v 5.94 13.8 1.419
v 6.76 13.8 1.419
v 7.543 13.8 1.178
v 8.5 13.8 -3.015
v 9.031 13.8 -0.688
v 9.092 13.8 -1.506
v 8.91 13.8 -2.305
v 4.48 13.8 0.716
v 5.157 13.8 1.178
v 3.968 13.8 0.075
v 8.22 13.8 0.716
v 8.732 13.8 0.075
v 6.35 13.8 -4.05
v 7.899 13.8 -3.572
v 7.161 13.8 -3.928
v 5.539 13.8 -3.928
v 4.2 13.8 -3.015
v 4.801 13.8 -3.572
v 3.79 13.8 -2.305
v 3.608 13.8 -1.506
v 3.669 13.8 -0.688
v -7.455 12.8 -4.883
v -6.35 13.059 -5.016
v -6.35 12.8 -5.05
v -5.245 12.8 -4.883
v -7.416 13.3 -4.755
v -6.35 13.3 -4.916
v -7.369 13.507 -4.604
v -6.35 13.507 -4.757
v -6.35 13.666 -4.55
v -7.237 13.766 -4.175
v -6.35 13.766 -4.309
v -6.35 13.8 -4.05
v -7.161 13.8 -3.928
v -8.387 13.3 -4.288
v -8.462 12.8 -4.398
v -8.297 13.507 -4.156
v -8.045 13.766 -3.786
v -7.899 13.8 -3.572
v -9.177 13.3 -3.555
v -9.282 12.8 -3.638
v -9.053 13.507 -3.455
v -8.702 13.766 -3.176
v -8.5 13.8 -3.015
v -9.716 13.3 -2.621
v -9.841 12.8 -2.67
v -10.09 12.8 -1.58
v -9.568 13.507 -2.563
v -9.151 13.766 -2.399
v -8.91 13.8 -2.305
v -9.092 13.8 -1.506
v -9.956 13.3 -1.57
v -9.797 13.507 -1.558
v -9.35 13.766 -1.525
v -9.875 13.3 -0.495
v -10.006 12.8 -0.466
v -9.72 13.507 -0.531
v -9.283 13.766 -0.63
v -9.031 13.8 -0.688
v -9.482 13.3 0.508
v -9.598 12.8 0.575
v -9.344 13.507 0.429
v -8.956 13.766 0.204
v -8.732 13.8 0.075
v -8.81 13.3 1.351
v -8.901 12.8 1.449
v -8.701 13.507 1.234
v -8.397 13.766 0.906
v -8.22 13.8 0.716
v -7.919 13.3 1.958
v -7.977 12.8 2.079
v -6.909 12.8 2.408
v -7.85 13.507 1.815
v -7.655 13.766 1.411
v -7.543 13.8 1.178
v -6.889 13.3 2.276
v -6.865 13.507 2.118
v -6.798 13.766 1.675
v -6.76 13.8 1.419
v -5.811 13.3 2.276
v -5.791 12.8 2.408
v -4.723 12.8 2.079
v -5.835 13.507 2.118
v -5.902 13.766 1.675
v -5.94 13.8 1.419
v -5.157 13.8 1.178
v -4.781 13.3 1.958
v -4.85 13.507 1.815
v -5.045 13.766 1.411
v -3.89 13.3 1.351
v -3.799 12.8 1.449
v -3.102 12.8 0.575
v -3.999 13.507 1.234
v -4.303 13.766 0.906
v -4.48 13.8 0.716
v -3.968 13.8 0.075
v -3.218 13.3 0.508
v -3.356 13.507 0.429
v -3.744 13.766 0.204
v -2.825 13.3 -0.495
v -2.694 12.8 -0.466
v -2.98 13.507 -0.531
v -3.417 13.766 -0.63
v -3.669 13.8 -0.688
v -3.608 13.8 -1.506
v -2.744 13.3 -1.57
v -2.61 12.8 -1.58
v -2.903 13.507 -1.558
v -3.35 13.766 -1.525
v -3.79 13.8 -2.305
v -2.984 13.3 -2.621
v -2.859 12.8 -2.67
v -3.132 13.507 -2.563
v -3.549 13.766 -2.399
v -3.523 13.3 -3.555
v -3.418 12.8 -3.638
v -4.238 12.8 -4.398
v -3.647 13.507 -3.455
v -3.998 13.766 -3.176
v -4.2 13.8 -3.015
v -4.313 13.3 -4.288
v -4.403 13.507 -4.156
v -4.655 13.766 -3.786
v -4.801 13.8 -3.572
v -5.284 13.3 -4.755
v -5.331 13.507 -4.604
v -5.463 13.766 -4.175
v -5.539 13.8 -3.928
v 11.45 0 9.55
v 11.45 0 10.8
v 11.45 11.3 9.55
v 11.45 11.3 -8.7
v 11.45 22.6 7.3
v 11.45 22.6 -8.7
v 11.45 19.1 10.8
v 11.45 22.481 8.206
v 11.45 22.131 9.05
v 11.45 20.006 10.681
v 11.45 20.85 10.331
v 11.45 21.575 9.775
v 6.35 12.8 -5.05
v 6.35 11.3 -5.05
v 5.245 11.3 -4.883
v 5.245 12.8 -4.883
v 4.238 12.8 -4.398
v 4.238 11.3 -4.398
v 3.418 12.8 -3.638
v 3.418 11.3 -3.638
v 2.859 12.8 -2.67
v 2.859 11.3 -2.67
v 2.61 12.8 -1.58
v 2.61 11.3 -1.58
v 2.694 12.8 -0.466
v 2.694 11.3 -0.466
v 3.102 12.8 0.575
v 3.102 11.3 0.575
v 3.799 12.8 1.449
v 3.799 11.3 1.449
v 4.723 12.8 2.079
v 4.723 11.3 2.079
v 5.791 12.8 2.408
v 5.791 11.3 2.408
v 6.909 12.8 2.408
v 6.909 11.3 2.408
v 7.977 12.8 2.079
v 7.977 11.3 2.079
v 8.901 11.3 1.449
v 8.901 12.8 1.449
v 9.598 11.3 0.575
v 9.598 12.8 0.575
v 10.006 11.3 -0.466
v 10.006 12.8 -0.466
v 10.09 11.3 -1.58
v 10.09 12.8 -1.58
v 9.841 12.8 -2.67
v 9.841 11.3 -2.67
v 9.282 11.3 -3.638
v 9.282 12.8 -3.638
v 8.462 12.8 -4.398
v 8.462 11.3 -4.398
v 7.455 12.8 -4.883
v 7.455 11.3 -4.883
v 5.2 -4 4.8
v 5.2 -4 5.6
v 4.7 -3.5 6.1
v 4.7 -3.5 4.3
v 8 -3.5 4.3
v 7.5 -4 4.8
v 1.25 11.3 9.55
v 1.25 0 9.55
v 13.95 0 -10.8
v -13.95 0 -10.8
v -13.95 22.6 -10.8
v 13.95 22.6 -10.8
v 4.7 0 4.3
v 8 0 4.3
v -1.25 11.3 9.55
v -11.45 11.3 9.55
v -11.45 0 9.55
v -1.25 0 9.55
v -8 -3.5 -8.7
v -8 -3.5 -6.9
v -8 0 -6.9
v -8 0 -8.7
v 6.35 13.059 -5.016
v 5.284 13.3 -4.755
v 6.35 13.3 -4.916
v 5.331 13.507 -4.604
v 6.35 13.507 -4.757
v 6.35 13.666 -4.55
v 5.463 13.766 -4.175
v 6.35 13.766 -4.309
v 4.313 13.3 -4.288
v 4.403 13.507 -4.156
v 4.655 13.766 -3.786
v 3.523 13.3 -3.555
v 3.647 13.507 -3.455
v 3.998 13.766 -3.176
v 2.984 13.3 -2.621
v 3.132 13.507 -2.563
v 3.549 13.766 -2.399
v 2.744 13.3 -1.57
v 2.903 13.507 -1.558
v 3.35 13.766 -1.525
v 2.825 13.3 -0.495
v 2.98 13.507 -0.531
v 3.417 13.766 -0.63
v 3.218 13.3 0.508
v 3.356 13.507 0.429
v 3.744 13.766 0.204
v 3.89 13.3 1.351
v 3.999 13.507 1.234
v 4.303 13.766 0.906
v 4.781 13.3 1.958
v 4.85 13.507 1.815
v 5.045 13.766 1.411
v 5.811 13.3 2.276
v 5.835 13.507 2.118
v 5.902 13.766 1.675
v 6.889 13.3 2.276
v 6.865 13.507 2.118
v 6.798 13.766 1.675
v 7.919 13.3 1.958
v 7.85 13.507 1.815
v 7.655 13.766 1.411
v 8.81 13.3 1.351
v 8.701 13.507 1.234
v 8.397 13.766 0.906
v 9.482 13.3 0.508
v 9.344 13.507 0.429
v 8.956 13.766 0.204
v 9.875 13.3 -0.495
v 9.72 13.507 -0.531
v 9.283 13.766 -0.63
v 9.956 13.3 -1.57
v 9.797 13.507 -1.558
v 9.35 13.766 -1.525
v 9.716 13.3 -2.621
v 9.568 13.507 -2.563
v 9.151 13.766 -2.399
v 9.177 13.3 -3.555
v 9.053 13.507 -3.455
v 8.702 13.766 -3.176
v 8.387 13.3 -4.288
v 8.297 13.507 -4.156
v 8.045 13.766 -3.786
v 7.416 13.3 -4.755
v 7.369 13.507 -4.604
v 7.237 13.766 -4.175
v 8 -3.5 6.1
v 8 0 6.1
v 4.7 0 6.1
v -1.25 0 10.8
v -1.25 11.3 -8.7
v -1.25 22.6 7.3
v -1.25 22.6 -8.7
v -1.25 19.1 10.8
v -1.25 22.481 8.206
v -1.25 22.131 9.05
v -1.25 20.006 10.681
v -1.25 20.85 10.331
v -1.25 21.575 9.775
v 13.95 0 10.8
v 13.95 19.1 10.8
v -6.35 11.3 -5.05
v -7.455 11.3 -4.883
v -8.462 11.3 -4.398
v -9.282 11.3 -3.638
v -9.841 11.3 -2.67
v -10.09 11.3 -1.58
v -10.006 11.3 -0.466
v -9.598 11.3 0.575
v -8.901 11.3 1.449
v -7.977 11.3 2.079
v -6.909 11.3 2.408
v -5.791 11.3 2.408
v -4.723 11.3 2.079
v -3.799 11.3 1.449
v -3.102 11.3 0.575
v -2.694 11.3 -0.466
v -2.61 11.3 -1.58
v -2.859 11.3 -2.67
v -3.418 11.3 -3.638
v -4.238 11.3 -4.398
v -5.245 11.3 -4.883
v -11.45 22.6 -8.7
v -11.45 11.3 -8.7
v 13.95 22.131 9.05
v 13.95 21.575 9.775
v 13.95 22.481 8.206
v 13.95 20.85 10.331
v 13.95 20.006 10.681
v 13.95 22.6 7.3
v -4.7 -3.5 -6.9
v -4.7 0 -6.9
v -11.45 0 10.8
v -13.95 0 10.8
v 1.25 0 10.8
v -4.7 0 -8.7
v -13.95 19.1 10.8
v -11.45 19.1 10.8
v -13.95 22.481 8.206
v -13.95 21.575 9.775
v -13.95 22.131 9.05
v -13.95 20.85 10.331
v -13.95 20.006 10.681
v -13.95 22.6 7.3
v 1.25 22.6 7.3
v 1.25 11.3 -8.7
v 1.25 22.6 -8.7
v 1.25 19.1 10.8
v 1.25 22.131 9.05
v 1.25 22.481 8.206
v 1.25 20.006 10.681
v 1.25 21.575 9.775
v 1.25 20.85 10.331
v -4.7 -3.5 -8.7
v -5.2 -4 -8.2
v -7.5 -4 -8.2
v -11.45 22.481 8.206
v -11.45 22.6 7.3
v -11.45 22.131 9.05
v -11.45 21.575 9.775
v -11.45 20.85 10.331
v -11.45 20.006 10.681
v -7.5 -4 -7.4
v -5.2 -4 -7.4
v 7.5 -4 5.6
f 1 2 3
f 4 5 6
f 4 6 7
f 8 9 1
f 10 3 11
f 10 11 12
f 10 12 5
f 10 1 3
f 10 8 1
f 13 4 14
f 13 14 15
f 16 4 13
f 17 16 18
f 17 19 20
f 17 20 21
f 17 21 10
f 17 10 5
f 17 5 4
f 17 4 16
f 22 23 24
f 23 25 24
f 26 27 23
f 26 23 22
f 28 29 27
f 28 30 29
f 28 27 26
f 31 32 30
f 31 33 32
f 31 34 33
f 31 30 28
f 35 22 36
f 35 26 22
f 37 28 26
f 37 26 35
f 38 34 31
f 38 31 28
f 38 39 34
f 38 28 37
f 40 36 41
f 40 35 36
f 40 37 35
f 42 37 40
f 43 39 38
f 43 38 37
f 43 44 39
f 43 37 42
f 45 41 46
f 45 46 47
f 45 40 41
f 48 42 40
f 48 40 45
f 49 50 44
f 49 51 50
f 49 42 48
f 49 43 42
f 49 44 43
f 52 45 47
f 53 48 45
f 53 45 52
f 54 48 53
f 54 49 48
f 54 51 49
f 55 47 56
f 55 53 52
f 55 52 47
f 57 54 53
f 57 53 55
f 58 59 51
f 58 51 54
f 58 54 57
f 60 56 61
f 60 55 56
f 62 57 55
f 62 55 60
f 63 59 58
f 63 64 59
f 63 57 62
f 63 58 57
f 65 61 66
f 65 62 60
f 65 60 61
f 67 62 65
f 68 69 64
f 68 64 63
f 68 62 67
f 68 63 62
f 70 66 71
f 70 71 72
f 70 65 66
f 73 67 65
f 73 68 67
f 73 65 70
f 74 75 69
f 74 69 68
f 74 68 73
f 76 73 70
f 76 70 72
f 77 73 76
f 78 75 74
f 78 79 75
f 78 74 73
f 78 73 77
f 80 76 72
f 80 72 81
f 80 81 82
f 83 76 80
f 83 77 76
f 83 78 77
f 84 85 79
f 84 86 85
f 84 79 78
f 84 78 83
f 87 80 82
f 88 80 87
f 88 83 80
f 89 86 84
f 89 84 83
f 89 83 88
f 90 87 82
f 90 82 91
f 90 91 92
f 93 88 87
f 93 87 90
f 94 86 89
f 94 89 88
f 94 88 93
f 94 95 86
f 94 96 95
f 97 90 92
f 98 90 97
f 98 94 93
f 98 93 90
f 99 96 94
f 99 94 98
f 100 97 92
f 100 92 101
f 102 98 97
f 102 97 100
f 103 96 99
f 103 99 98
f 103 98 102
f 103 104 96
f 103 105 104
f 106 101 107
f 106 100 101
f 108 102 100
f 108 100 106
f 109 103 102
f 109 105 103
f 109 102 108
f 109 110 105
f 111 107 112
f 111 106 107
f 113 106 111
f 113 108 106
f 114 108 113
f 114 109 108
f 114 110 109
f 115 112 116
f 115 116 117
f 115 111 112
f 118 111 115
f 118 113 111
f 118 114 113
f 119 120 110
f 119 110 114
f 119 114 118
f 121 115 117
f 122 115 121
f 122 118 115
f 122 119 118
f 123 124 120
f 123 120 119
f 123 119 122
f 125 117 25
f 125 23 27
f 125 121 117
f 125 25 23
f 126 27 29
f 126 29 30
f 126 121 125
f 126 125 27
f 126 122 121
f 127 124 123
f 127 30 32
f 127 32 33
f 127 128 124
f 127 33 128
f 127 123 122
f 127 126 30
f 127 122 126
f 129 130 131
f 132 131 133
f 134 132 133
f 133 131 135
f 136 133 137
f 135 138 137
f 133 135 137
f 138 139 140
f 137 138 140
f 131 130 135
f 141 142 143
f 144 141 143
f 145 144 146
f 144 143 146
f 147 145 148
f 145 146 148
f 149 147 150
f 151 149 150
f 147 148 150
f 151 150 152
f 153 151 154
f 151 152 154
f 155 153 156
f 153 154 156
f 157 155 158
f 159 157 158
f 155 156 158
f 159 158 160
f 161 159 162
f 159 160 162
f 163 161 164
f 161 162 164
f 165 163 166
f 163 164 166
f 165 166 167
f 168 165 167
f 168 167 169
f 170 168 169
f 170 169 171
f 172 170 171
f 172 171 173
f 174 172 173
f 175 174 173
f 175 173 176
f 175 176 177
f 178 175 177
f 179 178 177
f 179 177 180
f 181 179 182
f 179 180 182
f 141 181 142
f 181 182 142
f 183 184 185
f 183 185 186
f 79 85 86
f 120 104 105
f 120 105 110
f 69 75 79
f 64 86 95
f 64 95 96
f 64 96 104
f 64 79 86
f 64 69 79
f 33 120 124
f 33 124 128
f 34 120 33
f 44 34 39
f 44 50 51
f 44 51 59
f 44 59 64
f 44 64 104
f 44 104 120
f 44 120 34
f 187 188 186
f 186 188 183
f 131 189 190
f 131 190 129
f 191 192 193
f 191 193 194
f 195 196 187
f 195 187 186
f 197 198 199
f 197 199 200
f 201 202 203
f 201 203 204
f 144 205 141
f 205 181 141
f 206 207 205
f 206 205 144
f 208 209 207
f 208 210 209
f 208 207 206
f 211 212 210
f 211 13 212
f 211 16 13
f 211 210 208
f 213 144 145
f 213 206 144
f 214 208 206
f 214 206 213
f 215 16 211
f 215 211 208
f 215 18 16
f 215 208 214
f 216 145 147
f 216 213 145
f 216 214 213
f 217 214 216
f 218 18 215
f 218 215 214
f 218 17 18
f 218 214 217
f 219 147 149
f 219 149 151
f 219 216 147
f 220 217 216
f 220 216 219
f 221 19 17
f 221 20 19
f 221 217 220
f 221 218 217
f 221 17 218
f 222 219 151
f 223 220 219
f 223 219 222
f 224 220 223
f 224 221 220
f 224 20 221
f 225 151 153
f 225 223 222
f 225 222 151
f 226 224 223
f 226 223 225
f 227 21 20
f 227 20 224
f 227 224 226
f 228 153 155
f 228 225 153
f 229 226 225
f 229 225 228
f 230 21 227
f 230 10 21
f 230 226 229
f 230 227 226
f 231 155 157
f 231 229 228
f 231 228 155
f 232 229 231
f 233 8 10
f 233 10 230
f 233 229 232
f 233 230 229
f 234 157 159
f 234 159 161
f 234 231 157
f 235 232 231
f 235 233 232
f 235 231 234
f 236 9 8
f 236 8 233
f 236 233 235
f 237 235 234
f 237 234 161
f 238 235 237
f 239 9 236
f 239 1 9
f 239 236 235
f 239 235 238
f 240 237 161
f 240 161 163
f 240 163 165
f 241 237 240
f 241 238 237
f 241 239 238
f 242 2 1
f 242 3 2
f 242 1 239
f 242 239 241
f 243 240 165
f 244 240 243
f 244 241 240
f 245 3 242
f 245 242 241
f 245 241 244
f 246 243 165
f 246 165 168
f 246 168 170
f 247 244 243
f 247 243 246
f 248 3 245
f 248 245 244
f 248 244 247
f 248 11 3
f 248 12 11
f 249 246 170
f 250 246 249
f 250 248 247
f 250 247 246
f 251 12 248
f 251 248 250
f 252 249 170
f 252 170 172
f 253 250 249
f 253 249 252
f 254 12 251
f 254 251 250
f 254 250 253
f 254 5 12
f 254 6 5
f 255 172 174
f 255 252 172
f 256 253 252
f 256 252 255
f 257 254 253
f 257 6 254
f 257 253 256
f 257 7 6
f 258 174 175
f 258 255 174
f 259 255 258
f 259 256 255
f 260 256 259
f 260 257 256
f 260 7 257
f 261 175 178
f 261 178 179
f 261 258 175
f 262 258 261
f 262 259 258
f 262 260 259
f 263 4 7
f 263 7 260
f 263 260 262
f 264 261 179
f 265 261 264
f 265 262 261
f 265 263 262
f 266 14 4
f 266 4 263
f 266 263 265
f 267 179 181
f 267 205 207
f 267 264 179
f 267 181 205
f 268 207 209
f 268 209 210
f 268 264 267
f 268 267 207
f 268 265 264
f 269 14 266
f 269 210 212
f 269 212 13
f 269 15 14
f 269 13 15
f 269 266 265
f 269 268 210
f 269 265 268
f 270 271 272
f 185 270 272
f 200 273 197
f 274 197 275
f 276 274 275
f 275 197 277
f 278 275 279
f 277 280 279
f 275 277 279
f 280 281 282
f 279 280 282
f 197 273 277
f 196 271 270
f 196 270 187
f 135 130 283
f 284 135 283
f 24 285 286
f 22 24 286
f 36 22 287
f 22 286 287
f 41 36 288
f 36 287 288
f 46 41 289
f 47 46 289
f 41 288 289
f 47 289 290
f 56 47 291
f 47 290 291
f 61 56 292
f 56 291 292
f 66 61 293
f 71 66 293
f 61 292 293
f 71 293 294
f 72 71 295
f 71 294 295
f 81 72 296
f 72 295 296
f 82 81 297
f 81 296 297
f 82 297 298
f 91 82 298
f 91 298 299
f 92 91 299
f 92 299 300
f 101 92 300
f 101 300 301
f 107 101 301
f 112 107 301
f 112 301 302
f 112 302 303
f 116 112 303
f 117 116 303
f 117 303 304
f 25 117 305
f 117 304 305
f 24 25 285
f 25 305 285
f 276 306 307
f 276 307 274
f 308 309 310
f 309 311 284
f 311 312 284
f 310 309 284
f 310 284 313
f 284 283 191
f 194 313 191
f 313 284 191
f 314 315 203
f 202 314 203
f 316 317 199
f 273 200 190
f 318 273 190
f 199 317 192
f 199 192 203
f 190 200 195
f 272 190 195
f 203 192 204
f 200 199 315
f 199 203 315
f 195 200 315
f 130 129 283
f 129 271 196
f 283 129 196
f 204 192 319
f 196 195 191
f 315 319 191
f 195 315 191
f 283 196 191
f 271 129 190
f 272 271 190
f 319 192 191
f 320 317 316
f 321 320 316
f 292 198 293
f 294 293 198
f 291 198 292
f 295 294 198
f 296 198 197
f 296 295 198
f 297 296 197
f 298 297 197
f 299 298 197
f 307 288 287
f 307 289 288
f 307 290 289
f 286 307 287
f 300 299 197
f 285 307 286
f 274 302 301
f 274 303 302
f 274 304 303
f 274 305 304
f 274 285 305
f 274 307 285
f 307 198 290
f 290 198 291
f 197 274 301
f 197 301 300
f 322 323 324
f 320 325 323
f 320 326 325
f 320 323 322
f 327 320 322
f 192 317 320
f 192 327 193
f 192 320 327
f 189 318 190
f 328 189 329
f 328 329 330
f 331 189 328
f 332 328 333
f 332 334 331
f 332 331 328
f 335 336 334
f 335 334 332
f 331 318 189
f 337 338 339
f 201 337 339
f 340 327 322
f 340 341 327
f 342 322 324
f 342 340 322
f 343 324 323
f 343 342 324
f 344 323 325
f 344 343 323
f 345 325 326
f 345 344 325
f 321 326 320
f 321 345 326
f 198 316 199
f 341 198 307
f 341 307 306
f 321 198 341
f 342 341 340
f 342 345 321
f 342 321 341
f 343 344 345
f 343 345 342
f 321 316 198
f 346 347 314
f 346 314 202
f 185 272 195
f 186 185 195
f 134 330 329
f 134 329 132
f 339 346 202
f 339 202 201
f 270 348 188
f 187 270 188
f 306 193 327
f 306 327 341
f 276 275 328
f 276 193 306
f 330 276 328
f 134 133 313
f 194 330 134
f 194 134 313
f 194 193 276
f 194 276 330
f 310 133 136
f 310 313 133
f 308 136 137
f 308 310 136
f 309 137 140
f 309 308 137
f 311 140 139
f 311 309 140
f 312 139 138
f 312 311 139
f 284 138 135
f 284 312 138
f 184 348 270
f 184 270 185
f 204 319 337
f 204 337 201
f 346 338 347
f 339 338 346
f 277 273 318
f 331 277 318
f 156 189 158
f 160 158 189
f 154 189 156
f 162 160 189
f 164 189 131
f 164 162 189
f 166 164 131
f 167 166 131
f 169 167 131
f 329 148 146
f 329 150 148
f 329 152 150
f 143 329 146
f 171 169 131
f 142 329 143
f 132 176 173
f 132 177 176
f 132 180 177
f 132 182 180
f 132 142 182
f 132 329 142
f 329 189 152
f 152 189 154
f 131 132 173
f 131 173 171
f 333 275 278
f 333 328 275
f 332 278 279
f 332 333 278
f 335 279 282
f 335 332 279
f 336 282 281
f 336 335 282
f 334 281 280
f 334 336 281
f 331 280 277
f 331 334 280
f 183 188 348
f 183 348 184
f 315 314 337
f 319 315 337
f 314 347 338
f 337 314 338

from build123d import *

# Parameters (mm, degrees)
SKETCH1_W              = 27.9
SKETCH1_H              = 21.6
BOSS_EXTRUDE1_DEPTH    = 22.6
SKETCH2_W              = 10.2
SKETCH2_H              = 19.5
CUT_EXTRUDE1_DEPTH     = 11.3
LPATTERN1_COUNT        = 2
LPATTERN1_PITCH        = 12.7
SKETCH4_W              = 3.3
SKETCH4_H              = 1.8
BOSS_EXTRUDE2_DEPTH    = 4
CHAMFER1_SIZE          = 0.5
SKETCH6_W              = 10.2
SKETCH6_H              = 11.3
CUT_EXTRUDE3_DEPTH     = 1.25
LPATTERN2_COUNT        = 2
LPATTERN2_PITCH        = 12.7
SKETCH7_R              = 3.75
BOSS_EXTRUDE3_DEPTH    = 2.5
FILLET1_R              = 1
LPATTERN3_COUNT        = 2
LPATTERN3_PITCH        = 12.7
FILLET1_OF_LPATTERN3_R = 1
FILLET2_R              = 3.5


with BuildPart() as part:
    # Sketch1 → Boss-Extrude1 (new body)
    with BuildSketch(Plane(origin=(0, 0, 0), x_dir=(1, 0, 0), z_dir=(0, 1, 0))):
        Rectangle(SKETCH1_W, SKETCH1_H)
    extrude(amount=BOSS_EXTRUDE1_DEPTH)

    # Sketch2 → Cut-Extrude1 (cut)
    with BuildSketch(Plane(origin=(0, 22.6, 0), x_dir=(1, 0, 0), z_dir=(0, 1, 0))):
        with Locations((-6.35, -1.05)):
            Rectangle(SKETCH2_W, SKETCH2_H)
    cut_extrude1 = extrude(amount=-CUT_EXTRUDE1_DEPTH, mode=Mode.SUBTRACT)

    # LPattern1: Cut-Extrude1 ×2
    with Locations(*[(i * LPATTERN1_PITCH, 0, 0) for i in range(1, LPATTERN1_COUNT)]):
        add(cut_extrude1, mode=Mode.SUBTRACT)

    # Sketch4 → Boss-Extrude2 (add)
    with BuildSketch(Plane(origin=(0, 0, 0), x_dir=(-1, 0, 0), z_dir=(0, -1, 0))):
        with Locations((-6.35, -5.2)):
            Rectangle(SKETCH4_W, SKETCH4_H)
        with Locations((6.35, 7.8)):
            Rectangle(SKETCH4_W, SKETCH4_H)
    extrude(amount=BOSS_EXTRUDE2_DEPTH)

    # Chamfer1
    chamfer1_edges = [part.edges().sort_by_distance(p)[0] for p in [
        (4.7, -4, 5.2),
        (6.35, -4, 4.3),
        (8, -4, 5.2),
        (6.35, -4, 6.1),
        (-8, -4, -7.8),
        (-6.35, -4, -8.7),
        (-4.7, -4, -7.8),
        (-6.35, -4, -6.9),
    ]]
    chamfer(chamfer1_edges, length=CHAMFER1_SIZE)

    # Sketch6 → Cut-Extrude3 (cut)
    with BuildSketch(Plane.XY.offset(10.8)):
        with Locations((-6.35, 5.65)):
            Rectangle(SKETCH6_W, SKETCH6_H)
    cut_extrude3 = extrude(amount=-CUT_EXTRUDE3_DEPTH, mode=Mode.SUBTRACT)

    # LPattern2: Cut-Extrude3 ×2
    with Locations(*[(i * LPATTERN2_PITCH, 0, 0) for i in range(1, LPATTERN2_COUNT)]):
        add(cut_extrude3, mode=Mode.SUBTRACT)

    # Sketch7 → Boss-Extrude3 (add)
    with BuildSketch(Plane(origin=(0, 11.3, 0), x_dir=(1, 0, 0), z_dir=(0, 1, 0))):
        with Locations(Location((-6.35, 1.3, 0), (0, 0, 90))):
            Circle(SKETCH7_R)
    boss_extrude3 = extrude(amount=BOSS_EXTRUDE3_DEPTH)

    # Fillet1
    fillet1_edges = [part.edges().sort_by_distance(p)[0] for p in [
        (-6.35, 13.8, 2.45),
    ]]
    fillet(fillet1_edges, radius=FILLET1_R)

    # LPattern3: Boss-Extrude3 ×2
    with Locations(*[(i * LPATTERN3_PITCH, 0, 0) for i in range(1, LPATTERN3_COUNT)]):
        add(boss_extrude3)

    # Fillet1 of LPattern3
    fillet1_of_lpattern3_edges = [part.edges().sort_by_distance(p)[0] for p in [
        (6.35, 13.8, 2.45),
    ]]
    fillet(fillet1_of_lpattern3_edges, radius=FILLET1_OF_LPATTERN3_R)

    # Fillet2
    fillet2_edges = [part.edges().sort_by_distance(p)[0] for p in [
        (-12.7, 22.6, 10.8),
        (0, 22.6, 10.8),
        (12.7, 22.6, 10.8),
    ]]
    fillet(fillet2_edges, radius=FILLET2_R)


solid = part.part
